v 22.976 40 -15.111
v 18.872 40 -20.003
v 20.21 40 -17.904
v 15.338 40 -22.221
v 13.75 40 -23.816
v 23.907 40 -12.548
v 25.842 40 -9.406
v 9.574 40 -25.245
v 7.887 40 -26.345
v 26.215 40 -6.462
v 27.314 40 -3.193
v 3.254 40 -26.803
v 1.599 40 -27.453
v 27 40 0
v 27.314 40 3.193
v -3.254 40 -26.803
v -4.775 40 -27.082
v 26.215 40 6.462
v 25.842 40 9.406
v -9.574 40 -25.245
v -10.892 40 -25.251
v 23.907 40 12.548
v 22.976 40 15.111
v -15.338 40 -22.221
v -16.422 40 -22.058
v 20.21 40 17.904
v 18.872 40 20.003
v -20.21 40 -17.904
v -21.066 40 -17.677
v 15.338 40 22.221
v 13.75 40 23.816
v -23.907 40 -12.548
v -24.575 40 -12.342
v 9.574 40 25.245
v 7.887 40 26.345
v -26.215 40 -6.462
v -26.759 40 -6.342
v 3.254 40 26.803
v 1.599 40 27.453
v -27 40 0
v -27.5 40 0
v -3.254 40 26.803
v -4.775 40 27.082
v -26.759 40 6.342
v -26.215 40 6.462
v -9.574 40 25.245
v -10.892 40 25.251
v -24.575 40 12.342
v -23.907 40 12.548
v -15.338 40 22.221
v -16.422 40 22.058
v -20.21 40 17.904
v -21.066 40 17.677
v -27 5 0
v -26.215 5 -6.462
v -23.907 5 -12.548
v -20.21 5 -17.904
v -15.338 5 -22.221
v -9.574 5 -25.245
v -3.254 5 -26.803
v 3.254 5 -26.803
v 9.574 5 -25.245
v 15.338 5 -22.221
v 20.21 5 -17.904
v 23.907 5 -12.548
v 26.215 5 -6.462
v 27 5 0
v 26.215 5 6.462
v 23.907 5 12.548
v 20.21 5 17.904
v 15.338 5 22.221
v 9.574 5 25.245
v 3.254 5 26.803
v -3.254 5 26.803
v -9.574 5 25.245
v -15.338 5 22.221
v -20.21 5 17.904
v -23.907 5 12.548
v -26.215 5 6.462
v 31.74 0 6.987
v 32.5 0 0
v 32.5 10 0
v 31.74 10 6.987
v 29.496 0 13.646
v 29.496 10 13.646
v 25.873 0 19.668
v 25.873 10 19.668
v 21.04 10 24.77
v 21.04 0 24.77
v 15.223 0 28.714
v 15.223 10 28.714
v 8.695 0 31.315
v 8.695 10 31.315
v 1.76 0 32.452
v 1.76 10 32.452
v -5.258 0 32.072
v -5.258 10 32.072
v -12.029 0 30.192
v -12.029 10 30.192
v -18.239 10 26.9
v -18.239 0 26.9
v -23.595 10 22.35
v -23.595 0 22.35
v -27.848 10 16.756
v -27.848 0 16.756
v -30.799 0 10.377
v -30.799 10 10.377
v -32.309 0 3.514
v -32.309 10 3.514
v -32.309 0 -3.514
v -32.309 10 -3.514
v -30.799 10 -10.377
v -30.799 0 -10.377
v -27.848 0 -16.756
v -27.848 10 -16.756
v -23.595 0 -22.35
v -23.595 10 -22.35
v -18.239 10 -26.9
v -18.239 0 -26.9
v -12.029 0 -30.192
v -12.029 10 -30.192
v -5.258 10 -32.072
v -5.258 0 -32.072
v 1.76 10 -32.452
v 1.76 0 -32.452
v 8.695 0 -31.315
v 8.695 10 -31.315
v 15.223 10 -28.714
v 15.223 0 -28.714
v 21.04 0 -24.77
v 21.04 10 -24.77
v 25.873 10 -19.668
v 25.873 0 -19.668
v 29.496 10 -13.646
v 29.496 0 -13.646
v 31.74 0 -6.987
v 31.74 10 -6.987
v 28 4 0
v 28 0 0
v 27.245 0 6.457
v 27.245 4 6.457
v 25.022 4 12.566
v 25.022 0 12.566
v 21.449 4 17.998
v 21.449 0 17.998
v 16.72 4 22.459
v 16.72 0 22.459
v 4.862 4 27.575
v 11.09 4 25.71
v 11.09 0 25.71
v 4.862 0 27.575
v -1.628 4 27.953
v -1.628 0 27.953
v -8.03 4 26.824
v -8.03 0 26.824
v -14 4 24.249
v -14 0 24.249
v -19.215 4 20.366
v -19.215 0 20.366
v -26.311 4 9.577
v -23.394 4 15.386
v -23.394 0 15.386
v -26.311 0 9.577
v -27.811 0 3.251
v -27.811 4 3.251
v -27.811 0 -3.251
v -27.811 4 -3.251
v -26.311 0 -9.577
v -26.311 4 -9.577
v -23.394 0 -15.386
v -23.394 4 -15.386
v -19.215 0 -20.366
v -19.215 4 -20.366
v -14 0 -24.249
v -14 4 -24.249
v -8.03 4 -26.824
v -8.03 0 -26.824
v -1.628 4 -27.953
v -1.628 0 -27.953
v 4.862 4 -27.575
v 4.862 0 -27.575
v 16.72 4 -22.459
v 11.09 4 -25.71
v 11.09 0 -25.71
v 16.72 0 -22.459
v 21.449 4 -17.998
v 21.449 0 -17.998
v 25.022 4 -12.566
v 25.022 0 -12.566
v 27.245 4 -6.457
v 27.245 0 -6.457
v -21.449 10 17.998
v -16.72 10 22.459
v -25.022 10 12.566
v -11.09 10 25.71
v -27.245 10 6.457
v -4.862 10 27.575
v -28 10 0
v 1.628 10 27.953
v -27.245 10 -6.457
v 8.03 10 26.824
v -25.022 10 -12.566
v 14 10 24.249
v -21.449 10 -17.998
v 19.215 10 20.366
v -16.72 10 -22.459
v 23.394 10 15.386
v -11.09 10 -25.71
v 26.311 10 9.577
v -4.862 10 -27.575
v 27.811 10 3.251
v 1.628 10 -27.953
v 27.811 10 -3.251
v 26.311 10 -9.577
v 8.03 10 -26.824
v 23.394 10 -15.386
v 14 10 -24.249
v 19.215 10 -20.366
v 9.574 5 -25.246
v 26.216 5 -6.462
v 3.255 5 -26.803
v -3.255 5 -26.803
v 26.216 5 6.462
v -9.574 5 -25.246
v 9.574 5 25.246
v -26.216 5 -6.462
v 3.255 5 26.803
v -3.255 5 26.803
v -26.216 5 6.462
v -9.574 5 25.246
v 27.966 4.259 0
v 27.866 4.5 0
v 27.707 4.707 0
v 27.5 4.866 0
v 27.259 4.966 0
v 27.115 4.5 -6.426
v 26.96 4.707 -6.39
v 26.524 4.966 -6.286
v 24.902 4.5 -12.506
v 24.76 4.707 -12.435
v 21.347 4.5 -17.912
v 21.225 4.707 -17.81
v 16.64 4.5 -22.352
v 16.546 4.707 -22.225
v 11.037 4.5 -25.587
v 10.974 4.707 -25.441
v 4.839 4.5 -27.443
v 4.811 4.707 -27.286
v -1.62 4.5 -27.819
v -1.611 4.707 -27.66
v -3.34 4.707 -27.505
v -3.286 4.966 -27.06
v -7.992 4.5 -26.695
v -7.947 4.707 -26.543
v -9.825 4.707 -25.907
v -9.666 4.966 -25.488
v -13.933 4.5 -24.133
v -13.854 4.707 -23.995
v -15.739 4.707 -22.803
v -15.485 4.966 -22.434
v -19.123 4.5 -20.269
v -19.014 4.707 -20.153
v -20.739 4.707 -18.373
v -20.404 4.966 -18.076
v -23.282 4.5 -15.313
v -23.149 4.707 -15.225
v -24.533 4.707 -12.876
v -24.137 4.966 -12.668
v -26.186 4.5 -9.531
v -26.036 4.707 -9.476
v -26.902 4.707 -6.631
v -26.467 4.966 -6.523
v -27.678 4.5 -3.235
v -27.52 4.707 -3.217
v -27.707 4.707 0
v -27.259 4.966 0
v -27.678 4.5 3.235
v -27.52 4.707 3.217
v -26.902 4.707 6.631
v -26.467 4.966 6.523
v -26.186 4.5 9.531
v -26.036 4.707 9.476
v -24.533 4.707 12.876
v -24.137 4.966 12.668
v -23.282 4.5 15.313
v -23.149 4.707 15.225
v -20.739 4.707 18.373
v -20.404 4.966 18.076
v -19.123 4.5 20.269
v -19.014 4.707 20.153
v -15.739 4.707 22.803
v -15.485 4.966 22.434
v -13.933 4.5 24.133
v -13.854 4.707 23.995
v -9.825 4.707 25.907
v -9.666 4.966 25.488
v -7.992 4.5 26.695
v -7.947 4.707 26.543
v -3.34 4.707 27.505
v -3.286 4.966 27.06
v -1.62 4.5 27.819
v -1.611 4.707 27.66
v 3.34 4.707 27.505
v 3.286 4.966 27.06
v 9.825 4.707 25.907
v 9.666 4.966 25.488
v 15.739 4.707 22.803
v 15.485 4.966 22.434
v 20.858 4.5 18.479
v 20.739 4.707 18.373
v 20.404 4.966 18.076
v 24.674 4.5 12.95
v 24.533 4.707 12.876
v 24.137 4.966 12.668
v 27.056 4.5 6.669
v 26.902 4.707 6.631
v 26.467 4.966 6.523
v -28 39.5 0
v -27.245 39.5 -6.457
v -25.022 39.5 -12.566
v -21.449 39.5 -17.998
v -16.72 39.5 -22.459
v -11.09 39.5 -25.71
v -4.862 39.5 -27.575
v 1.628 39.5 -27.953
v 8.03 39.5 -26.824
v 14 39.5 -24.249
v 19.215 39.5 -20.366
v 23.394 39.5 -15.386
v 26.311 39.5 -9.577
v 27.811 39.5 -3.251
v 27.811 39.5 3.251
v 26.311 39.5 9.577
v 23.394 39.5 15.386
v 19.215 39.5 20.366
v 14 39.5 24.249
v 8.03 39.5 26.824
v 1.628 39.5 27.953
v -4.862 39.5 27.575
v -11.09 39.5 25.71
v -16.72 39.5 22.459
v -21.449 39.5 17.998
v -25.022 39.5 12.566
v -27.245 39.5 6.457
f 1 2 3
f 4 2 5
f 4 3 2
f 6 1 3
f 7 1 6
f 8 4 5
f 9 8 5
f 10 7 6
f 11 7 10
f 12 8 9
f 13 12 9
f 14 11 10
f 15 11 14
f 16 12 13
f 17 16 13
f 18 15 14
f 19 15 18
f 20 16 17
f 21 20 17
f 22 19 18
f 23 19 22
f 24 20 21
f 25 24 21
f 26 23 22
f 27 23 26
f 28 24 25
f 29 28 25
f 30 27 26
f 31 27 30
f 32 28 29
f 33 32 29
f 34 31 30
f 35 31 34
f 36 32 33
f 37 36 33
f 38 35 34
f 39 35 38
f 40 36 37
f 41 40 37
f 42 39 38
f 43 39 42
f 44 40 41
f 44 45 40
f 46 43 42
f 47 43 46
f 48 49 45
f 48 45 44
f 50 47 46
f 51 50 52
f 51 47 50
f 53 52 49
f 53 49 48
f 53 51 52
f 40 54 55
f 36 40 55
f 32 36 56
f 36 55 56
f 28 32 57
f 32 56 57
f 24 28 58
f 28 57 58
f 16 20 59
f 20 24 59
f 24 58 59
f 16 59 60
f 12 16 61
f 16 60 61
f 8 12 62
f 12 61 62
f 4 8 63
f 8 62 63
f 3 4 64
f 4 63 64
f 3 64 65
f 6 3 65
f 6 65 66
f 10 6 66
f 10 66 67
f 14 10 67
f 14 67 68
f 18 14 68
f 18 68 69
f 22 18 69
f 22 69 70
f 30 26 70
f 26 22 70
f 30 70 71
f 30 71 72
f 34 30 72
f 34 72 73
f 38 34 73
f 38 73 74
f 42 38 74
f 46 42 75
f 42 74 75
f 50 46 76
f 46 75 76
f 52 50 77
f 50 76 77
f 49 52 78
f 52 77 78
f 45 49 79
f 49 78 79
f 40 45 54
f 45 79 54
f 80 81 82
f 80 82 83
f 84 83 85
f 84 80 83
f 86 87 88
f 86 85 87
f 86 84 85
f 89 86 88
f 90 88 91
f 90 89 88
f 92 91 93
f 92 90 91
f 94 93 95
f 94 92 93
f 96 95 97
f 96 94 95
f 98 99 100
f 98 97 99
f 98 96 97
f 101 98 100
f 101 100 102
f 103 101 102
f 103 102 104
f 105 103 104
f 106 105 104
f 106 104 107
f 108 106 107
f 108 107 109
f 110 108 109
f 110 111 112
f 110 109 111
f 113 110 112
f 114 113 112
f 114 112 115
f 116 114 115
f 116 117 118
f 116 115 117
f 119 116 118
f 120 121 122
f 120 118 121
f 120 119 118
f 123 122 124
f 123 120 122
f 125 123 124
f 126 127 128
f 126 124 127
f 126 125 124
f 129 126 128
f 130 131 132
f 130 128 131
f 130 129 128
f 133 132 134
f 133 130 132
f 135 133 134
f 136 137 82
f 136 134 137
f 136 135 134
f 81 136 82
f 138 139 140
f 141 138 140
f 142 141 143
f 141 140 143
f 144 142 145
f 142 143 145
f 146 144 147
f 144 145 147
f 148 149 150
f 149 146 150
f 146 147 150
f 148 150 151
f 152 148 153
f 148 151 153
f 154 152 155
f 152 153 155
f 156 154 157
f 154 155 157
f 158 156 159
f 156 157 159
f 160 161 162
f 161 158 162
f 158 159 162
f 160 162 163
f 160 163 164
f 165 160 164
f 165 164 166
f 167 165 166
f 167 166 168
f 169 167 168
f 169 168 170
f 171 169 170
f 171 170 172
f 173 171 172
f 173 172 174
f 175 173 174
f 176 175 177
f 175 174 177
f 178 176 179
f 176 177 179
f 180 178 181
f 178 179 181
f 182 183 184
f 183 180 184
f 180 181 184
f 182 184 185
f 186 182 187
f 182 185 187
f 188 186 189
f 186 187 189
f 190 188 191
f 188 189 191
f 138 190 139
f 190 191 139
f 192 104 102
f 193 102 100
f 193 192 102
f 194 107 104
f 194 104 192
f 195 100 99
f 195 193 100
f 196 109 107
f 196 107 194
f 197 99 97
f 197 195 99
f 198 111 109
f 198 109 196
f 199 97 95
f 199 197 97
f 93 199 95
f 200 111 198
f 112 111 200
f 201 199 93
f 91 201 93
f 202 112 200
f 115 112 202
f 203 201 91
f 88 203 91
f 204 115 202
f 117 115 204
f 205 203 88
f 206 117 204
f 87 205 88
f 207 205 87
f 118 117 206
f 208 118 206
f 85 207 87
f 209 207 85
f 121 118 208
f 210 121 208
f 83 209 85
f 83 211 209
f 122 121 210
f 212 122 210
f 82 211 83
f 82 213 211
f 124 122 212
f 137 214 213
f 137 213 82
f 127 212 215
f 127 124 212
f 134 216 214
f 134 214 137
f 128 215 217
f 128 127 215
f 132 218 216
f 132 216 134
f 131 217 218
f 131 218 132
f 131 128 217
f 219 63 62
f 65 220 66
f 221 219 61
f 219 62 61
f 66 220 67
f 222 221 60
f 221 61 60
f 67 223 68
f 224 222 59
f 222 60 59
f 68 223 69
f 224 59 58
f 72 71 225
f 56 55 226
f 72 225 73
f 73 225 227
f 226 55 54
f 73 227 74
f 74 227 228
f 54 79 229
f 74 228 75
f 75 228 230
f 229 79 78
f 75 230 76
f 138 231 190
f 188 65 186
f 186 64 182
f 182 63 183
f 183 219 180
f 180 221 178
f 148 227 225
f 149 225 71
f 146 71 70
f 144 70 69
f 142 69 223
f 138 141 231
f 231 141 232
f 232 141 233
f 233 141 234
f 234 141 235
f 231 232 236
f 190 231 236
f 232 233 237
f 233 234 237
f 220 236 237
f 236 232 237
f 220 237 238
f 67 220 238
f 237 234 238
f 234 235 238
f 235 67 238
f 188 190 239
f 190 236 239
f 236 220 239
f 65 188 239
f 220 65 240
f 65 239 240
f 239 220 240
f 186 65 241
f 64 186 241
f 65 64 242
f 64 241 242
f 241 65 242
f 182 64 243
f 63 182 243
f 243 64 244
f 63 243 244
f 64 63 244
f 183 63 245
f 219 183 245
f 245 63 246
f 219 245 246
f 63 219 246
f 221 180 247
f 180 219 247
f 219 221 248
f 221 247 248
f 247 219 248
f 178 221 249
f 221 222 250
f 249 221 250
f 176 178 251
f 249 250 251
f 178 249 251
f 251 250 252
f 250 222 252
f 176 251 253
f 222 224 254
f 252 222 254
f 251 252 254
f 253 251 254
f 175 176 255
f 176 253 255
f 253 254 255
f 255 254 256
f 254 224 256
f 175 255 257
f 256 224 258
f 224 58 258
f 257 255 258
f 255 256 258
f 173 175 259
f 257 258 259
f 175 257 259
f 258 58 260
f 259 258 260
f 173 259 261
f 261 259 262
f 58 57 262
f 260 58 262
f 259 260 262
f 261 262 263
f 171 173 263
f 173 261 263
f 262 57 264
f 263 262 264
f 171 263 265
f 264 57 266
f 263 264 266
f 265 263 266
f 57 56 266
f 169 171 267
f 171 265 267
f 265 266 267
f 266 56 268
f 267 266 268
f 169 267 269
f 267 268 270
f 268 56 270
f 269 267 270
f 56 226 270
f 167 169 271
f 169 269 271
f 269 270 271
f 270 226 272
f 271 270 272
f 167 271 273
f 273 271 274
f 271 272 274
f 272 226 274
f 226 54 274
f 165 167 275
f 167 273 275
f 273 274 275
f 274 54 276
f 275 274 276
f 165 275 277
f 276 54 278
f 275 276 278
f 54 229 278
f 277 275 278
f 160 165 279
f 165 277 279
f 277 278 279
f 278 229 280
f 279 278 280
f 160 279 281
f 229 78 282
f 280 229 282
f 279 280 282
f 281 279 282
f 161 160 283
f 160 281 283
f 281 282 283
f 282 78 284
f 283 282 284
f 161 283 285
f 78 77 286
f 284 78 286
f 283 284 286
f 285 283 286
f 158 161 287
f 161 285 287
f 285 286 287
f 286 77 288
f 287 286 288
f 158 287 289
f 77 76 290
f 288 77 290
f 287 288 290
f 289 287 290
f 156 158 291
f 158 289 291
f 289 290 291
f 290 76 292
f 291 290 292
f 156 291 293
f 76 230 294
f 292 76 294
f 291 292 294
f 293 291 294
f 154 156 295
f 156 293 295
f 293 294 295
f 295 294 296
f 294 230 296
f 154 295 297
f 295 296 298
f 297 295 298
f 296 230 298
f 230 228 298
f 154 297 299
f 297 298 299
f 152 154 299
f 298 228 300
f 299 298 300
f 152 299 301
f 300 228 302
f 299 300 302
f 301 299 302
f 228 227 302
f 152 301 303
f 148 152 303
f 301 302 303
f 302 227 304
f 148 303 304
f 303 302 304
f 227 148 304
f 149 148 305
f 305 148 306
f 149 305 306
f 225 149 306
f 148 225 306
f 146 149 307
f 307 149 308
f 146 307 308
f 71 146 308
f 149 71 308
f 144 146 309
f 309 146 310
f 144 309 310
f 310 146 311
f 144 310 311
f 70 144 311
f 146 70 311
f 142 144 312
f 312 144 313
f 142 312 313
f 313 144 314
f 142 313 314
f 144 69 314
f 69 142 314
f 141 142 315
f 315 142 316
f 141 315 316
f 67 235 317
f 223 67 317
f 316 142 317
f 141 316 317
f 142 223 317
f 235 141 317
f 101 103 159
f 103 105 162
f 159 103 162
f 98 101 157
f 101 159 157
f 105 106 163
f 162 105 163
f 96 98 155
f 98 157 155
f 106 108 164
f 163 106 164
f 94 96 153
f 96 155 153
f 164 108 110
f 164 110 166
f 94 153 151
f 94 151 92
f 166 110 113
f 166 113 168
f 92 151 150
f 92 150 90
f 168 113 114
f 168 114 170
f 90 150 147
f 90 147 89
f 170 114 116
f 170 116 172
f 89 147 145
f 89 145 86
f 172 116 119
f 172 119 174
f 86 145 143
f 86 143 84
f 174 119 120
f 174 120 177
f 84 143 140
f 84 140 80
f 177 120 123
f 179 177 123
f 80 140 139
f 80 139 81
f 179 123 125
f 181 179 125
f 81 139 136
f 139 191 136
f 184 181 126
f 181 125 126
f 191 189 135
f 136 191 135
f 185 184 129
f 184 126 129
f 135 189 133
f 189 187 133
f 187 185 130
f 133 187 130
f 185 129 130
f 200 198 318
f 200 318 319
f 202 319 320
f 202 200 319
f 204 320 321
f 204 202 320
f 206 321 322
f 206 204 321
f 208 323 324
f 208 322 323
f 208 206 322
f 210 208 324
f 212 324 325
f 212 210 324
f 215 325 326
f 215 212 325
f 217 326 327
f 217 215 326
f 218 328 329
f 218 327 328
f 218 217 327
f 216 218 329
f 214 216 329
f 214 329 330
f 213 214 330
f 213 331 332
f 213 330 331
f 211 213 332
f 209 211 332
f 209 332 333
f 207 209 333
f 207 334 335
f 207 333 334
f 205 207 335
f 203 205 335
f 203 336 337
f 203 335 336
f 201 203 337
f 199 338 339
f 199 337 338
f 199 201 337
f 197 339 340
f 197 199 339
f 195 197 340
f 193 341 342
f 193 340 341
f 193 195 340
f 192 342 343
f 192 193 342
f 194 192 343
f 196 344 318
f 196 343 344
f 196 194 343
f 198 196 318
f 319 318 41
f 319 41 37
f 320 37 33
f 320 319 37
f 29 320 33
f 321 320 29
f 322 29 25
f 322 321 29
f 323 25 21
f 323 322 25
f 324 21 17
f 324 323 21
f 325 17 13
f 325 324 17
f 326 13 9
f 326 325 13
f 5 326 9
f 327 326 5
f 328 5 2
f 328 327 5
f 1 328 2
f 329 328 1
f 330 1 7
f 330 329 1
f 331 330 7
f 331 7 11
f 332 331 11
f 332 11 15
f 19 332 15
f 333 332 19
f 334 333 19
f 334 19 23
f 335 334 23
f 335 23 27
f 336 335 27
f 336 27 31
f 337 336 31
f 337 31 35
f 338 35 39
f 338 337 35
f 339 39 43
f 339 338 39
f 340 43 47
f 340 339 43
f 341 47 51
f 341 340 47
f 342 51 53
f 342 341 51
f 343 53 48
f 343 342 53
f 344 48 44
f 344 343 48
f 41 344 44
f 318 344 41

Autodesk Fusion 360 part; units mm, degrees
sketch "Sketch1" plane through (0, 0, 0) normal (0, 1, 0) x (1, 0, 0)
  circle A0 centre (0, 0) radius 32.5
  circle A1 centre (0, 0) radius 28.5
  dimension "d1" = 65
  dimension "d2" = 57
extrude "Extrude1" add sketch "Sketch1" along normal blind 10 makes body 1
sketch "Sketch2" plane through (0, 10, 0) normal (0, 1, 0) x (-1, 0, 0)
  circle A0 centre (0, 0) radius 28.5
  circle A1 centre (0, 0) radius 32.5
  circle A2 centre (0, 0) radius 28.5
  circle A3 centre (0, 0) radius 28
  circle A4 centre (0, 0) radius 27
  dimension "d5" = -0.5
  dimension "d8" = -1.5
extrude "Extrude3" add sketch "Sketch2" along normal blind 30 and the other way blind 5 separate body contours A3 makes body 2
sketch "Sketch3" plane through (0, 0, 0) normal (0, -1, 0) x (1, 0, 0)
  circle A0 centre (0, 0) radius 28.5
  circle A1 centre (0, 0) radius 32.5
  circle A2 centre (0, 0) radius 28.5
  circle A3 centre (0, 0) radius 28
extrude "Extrude4" add sketch "Sketch3" against normal blind 10 contours A0 A2 bodies 1 2
fillet "Fillet1" radius 1 1 edges at (26.1052, 5, 10.1252) on bodies 1
chamfer "Chamfer1" distance 0.5 angle 45 1 edges at (26.1052, 40, -10.1252) on bodies 1 2
equation "d8 = -0.5 mm - 1 mm"
